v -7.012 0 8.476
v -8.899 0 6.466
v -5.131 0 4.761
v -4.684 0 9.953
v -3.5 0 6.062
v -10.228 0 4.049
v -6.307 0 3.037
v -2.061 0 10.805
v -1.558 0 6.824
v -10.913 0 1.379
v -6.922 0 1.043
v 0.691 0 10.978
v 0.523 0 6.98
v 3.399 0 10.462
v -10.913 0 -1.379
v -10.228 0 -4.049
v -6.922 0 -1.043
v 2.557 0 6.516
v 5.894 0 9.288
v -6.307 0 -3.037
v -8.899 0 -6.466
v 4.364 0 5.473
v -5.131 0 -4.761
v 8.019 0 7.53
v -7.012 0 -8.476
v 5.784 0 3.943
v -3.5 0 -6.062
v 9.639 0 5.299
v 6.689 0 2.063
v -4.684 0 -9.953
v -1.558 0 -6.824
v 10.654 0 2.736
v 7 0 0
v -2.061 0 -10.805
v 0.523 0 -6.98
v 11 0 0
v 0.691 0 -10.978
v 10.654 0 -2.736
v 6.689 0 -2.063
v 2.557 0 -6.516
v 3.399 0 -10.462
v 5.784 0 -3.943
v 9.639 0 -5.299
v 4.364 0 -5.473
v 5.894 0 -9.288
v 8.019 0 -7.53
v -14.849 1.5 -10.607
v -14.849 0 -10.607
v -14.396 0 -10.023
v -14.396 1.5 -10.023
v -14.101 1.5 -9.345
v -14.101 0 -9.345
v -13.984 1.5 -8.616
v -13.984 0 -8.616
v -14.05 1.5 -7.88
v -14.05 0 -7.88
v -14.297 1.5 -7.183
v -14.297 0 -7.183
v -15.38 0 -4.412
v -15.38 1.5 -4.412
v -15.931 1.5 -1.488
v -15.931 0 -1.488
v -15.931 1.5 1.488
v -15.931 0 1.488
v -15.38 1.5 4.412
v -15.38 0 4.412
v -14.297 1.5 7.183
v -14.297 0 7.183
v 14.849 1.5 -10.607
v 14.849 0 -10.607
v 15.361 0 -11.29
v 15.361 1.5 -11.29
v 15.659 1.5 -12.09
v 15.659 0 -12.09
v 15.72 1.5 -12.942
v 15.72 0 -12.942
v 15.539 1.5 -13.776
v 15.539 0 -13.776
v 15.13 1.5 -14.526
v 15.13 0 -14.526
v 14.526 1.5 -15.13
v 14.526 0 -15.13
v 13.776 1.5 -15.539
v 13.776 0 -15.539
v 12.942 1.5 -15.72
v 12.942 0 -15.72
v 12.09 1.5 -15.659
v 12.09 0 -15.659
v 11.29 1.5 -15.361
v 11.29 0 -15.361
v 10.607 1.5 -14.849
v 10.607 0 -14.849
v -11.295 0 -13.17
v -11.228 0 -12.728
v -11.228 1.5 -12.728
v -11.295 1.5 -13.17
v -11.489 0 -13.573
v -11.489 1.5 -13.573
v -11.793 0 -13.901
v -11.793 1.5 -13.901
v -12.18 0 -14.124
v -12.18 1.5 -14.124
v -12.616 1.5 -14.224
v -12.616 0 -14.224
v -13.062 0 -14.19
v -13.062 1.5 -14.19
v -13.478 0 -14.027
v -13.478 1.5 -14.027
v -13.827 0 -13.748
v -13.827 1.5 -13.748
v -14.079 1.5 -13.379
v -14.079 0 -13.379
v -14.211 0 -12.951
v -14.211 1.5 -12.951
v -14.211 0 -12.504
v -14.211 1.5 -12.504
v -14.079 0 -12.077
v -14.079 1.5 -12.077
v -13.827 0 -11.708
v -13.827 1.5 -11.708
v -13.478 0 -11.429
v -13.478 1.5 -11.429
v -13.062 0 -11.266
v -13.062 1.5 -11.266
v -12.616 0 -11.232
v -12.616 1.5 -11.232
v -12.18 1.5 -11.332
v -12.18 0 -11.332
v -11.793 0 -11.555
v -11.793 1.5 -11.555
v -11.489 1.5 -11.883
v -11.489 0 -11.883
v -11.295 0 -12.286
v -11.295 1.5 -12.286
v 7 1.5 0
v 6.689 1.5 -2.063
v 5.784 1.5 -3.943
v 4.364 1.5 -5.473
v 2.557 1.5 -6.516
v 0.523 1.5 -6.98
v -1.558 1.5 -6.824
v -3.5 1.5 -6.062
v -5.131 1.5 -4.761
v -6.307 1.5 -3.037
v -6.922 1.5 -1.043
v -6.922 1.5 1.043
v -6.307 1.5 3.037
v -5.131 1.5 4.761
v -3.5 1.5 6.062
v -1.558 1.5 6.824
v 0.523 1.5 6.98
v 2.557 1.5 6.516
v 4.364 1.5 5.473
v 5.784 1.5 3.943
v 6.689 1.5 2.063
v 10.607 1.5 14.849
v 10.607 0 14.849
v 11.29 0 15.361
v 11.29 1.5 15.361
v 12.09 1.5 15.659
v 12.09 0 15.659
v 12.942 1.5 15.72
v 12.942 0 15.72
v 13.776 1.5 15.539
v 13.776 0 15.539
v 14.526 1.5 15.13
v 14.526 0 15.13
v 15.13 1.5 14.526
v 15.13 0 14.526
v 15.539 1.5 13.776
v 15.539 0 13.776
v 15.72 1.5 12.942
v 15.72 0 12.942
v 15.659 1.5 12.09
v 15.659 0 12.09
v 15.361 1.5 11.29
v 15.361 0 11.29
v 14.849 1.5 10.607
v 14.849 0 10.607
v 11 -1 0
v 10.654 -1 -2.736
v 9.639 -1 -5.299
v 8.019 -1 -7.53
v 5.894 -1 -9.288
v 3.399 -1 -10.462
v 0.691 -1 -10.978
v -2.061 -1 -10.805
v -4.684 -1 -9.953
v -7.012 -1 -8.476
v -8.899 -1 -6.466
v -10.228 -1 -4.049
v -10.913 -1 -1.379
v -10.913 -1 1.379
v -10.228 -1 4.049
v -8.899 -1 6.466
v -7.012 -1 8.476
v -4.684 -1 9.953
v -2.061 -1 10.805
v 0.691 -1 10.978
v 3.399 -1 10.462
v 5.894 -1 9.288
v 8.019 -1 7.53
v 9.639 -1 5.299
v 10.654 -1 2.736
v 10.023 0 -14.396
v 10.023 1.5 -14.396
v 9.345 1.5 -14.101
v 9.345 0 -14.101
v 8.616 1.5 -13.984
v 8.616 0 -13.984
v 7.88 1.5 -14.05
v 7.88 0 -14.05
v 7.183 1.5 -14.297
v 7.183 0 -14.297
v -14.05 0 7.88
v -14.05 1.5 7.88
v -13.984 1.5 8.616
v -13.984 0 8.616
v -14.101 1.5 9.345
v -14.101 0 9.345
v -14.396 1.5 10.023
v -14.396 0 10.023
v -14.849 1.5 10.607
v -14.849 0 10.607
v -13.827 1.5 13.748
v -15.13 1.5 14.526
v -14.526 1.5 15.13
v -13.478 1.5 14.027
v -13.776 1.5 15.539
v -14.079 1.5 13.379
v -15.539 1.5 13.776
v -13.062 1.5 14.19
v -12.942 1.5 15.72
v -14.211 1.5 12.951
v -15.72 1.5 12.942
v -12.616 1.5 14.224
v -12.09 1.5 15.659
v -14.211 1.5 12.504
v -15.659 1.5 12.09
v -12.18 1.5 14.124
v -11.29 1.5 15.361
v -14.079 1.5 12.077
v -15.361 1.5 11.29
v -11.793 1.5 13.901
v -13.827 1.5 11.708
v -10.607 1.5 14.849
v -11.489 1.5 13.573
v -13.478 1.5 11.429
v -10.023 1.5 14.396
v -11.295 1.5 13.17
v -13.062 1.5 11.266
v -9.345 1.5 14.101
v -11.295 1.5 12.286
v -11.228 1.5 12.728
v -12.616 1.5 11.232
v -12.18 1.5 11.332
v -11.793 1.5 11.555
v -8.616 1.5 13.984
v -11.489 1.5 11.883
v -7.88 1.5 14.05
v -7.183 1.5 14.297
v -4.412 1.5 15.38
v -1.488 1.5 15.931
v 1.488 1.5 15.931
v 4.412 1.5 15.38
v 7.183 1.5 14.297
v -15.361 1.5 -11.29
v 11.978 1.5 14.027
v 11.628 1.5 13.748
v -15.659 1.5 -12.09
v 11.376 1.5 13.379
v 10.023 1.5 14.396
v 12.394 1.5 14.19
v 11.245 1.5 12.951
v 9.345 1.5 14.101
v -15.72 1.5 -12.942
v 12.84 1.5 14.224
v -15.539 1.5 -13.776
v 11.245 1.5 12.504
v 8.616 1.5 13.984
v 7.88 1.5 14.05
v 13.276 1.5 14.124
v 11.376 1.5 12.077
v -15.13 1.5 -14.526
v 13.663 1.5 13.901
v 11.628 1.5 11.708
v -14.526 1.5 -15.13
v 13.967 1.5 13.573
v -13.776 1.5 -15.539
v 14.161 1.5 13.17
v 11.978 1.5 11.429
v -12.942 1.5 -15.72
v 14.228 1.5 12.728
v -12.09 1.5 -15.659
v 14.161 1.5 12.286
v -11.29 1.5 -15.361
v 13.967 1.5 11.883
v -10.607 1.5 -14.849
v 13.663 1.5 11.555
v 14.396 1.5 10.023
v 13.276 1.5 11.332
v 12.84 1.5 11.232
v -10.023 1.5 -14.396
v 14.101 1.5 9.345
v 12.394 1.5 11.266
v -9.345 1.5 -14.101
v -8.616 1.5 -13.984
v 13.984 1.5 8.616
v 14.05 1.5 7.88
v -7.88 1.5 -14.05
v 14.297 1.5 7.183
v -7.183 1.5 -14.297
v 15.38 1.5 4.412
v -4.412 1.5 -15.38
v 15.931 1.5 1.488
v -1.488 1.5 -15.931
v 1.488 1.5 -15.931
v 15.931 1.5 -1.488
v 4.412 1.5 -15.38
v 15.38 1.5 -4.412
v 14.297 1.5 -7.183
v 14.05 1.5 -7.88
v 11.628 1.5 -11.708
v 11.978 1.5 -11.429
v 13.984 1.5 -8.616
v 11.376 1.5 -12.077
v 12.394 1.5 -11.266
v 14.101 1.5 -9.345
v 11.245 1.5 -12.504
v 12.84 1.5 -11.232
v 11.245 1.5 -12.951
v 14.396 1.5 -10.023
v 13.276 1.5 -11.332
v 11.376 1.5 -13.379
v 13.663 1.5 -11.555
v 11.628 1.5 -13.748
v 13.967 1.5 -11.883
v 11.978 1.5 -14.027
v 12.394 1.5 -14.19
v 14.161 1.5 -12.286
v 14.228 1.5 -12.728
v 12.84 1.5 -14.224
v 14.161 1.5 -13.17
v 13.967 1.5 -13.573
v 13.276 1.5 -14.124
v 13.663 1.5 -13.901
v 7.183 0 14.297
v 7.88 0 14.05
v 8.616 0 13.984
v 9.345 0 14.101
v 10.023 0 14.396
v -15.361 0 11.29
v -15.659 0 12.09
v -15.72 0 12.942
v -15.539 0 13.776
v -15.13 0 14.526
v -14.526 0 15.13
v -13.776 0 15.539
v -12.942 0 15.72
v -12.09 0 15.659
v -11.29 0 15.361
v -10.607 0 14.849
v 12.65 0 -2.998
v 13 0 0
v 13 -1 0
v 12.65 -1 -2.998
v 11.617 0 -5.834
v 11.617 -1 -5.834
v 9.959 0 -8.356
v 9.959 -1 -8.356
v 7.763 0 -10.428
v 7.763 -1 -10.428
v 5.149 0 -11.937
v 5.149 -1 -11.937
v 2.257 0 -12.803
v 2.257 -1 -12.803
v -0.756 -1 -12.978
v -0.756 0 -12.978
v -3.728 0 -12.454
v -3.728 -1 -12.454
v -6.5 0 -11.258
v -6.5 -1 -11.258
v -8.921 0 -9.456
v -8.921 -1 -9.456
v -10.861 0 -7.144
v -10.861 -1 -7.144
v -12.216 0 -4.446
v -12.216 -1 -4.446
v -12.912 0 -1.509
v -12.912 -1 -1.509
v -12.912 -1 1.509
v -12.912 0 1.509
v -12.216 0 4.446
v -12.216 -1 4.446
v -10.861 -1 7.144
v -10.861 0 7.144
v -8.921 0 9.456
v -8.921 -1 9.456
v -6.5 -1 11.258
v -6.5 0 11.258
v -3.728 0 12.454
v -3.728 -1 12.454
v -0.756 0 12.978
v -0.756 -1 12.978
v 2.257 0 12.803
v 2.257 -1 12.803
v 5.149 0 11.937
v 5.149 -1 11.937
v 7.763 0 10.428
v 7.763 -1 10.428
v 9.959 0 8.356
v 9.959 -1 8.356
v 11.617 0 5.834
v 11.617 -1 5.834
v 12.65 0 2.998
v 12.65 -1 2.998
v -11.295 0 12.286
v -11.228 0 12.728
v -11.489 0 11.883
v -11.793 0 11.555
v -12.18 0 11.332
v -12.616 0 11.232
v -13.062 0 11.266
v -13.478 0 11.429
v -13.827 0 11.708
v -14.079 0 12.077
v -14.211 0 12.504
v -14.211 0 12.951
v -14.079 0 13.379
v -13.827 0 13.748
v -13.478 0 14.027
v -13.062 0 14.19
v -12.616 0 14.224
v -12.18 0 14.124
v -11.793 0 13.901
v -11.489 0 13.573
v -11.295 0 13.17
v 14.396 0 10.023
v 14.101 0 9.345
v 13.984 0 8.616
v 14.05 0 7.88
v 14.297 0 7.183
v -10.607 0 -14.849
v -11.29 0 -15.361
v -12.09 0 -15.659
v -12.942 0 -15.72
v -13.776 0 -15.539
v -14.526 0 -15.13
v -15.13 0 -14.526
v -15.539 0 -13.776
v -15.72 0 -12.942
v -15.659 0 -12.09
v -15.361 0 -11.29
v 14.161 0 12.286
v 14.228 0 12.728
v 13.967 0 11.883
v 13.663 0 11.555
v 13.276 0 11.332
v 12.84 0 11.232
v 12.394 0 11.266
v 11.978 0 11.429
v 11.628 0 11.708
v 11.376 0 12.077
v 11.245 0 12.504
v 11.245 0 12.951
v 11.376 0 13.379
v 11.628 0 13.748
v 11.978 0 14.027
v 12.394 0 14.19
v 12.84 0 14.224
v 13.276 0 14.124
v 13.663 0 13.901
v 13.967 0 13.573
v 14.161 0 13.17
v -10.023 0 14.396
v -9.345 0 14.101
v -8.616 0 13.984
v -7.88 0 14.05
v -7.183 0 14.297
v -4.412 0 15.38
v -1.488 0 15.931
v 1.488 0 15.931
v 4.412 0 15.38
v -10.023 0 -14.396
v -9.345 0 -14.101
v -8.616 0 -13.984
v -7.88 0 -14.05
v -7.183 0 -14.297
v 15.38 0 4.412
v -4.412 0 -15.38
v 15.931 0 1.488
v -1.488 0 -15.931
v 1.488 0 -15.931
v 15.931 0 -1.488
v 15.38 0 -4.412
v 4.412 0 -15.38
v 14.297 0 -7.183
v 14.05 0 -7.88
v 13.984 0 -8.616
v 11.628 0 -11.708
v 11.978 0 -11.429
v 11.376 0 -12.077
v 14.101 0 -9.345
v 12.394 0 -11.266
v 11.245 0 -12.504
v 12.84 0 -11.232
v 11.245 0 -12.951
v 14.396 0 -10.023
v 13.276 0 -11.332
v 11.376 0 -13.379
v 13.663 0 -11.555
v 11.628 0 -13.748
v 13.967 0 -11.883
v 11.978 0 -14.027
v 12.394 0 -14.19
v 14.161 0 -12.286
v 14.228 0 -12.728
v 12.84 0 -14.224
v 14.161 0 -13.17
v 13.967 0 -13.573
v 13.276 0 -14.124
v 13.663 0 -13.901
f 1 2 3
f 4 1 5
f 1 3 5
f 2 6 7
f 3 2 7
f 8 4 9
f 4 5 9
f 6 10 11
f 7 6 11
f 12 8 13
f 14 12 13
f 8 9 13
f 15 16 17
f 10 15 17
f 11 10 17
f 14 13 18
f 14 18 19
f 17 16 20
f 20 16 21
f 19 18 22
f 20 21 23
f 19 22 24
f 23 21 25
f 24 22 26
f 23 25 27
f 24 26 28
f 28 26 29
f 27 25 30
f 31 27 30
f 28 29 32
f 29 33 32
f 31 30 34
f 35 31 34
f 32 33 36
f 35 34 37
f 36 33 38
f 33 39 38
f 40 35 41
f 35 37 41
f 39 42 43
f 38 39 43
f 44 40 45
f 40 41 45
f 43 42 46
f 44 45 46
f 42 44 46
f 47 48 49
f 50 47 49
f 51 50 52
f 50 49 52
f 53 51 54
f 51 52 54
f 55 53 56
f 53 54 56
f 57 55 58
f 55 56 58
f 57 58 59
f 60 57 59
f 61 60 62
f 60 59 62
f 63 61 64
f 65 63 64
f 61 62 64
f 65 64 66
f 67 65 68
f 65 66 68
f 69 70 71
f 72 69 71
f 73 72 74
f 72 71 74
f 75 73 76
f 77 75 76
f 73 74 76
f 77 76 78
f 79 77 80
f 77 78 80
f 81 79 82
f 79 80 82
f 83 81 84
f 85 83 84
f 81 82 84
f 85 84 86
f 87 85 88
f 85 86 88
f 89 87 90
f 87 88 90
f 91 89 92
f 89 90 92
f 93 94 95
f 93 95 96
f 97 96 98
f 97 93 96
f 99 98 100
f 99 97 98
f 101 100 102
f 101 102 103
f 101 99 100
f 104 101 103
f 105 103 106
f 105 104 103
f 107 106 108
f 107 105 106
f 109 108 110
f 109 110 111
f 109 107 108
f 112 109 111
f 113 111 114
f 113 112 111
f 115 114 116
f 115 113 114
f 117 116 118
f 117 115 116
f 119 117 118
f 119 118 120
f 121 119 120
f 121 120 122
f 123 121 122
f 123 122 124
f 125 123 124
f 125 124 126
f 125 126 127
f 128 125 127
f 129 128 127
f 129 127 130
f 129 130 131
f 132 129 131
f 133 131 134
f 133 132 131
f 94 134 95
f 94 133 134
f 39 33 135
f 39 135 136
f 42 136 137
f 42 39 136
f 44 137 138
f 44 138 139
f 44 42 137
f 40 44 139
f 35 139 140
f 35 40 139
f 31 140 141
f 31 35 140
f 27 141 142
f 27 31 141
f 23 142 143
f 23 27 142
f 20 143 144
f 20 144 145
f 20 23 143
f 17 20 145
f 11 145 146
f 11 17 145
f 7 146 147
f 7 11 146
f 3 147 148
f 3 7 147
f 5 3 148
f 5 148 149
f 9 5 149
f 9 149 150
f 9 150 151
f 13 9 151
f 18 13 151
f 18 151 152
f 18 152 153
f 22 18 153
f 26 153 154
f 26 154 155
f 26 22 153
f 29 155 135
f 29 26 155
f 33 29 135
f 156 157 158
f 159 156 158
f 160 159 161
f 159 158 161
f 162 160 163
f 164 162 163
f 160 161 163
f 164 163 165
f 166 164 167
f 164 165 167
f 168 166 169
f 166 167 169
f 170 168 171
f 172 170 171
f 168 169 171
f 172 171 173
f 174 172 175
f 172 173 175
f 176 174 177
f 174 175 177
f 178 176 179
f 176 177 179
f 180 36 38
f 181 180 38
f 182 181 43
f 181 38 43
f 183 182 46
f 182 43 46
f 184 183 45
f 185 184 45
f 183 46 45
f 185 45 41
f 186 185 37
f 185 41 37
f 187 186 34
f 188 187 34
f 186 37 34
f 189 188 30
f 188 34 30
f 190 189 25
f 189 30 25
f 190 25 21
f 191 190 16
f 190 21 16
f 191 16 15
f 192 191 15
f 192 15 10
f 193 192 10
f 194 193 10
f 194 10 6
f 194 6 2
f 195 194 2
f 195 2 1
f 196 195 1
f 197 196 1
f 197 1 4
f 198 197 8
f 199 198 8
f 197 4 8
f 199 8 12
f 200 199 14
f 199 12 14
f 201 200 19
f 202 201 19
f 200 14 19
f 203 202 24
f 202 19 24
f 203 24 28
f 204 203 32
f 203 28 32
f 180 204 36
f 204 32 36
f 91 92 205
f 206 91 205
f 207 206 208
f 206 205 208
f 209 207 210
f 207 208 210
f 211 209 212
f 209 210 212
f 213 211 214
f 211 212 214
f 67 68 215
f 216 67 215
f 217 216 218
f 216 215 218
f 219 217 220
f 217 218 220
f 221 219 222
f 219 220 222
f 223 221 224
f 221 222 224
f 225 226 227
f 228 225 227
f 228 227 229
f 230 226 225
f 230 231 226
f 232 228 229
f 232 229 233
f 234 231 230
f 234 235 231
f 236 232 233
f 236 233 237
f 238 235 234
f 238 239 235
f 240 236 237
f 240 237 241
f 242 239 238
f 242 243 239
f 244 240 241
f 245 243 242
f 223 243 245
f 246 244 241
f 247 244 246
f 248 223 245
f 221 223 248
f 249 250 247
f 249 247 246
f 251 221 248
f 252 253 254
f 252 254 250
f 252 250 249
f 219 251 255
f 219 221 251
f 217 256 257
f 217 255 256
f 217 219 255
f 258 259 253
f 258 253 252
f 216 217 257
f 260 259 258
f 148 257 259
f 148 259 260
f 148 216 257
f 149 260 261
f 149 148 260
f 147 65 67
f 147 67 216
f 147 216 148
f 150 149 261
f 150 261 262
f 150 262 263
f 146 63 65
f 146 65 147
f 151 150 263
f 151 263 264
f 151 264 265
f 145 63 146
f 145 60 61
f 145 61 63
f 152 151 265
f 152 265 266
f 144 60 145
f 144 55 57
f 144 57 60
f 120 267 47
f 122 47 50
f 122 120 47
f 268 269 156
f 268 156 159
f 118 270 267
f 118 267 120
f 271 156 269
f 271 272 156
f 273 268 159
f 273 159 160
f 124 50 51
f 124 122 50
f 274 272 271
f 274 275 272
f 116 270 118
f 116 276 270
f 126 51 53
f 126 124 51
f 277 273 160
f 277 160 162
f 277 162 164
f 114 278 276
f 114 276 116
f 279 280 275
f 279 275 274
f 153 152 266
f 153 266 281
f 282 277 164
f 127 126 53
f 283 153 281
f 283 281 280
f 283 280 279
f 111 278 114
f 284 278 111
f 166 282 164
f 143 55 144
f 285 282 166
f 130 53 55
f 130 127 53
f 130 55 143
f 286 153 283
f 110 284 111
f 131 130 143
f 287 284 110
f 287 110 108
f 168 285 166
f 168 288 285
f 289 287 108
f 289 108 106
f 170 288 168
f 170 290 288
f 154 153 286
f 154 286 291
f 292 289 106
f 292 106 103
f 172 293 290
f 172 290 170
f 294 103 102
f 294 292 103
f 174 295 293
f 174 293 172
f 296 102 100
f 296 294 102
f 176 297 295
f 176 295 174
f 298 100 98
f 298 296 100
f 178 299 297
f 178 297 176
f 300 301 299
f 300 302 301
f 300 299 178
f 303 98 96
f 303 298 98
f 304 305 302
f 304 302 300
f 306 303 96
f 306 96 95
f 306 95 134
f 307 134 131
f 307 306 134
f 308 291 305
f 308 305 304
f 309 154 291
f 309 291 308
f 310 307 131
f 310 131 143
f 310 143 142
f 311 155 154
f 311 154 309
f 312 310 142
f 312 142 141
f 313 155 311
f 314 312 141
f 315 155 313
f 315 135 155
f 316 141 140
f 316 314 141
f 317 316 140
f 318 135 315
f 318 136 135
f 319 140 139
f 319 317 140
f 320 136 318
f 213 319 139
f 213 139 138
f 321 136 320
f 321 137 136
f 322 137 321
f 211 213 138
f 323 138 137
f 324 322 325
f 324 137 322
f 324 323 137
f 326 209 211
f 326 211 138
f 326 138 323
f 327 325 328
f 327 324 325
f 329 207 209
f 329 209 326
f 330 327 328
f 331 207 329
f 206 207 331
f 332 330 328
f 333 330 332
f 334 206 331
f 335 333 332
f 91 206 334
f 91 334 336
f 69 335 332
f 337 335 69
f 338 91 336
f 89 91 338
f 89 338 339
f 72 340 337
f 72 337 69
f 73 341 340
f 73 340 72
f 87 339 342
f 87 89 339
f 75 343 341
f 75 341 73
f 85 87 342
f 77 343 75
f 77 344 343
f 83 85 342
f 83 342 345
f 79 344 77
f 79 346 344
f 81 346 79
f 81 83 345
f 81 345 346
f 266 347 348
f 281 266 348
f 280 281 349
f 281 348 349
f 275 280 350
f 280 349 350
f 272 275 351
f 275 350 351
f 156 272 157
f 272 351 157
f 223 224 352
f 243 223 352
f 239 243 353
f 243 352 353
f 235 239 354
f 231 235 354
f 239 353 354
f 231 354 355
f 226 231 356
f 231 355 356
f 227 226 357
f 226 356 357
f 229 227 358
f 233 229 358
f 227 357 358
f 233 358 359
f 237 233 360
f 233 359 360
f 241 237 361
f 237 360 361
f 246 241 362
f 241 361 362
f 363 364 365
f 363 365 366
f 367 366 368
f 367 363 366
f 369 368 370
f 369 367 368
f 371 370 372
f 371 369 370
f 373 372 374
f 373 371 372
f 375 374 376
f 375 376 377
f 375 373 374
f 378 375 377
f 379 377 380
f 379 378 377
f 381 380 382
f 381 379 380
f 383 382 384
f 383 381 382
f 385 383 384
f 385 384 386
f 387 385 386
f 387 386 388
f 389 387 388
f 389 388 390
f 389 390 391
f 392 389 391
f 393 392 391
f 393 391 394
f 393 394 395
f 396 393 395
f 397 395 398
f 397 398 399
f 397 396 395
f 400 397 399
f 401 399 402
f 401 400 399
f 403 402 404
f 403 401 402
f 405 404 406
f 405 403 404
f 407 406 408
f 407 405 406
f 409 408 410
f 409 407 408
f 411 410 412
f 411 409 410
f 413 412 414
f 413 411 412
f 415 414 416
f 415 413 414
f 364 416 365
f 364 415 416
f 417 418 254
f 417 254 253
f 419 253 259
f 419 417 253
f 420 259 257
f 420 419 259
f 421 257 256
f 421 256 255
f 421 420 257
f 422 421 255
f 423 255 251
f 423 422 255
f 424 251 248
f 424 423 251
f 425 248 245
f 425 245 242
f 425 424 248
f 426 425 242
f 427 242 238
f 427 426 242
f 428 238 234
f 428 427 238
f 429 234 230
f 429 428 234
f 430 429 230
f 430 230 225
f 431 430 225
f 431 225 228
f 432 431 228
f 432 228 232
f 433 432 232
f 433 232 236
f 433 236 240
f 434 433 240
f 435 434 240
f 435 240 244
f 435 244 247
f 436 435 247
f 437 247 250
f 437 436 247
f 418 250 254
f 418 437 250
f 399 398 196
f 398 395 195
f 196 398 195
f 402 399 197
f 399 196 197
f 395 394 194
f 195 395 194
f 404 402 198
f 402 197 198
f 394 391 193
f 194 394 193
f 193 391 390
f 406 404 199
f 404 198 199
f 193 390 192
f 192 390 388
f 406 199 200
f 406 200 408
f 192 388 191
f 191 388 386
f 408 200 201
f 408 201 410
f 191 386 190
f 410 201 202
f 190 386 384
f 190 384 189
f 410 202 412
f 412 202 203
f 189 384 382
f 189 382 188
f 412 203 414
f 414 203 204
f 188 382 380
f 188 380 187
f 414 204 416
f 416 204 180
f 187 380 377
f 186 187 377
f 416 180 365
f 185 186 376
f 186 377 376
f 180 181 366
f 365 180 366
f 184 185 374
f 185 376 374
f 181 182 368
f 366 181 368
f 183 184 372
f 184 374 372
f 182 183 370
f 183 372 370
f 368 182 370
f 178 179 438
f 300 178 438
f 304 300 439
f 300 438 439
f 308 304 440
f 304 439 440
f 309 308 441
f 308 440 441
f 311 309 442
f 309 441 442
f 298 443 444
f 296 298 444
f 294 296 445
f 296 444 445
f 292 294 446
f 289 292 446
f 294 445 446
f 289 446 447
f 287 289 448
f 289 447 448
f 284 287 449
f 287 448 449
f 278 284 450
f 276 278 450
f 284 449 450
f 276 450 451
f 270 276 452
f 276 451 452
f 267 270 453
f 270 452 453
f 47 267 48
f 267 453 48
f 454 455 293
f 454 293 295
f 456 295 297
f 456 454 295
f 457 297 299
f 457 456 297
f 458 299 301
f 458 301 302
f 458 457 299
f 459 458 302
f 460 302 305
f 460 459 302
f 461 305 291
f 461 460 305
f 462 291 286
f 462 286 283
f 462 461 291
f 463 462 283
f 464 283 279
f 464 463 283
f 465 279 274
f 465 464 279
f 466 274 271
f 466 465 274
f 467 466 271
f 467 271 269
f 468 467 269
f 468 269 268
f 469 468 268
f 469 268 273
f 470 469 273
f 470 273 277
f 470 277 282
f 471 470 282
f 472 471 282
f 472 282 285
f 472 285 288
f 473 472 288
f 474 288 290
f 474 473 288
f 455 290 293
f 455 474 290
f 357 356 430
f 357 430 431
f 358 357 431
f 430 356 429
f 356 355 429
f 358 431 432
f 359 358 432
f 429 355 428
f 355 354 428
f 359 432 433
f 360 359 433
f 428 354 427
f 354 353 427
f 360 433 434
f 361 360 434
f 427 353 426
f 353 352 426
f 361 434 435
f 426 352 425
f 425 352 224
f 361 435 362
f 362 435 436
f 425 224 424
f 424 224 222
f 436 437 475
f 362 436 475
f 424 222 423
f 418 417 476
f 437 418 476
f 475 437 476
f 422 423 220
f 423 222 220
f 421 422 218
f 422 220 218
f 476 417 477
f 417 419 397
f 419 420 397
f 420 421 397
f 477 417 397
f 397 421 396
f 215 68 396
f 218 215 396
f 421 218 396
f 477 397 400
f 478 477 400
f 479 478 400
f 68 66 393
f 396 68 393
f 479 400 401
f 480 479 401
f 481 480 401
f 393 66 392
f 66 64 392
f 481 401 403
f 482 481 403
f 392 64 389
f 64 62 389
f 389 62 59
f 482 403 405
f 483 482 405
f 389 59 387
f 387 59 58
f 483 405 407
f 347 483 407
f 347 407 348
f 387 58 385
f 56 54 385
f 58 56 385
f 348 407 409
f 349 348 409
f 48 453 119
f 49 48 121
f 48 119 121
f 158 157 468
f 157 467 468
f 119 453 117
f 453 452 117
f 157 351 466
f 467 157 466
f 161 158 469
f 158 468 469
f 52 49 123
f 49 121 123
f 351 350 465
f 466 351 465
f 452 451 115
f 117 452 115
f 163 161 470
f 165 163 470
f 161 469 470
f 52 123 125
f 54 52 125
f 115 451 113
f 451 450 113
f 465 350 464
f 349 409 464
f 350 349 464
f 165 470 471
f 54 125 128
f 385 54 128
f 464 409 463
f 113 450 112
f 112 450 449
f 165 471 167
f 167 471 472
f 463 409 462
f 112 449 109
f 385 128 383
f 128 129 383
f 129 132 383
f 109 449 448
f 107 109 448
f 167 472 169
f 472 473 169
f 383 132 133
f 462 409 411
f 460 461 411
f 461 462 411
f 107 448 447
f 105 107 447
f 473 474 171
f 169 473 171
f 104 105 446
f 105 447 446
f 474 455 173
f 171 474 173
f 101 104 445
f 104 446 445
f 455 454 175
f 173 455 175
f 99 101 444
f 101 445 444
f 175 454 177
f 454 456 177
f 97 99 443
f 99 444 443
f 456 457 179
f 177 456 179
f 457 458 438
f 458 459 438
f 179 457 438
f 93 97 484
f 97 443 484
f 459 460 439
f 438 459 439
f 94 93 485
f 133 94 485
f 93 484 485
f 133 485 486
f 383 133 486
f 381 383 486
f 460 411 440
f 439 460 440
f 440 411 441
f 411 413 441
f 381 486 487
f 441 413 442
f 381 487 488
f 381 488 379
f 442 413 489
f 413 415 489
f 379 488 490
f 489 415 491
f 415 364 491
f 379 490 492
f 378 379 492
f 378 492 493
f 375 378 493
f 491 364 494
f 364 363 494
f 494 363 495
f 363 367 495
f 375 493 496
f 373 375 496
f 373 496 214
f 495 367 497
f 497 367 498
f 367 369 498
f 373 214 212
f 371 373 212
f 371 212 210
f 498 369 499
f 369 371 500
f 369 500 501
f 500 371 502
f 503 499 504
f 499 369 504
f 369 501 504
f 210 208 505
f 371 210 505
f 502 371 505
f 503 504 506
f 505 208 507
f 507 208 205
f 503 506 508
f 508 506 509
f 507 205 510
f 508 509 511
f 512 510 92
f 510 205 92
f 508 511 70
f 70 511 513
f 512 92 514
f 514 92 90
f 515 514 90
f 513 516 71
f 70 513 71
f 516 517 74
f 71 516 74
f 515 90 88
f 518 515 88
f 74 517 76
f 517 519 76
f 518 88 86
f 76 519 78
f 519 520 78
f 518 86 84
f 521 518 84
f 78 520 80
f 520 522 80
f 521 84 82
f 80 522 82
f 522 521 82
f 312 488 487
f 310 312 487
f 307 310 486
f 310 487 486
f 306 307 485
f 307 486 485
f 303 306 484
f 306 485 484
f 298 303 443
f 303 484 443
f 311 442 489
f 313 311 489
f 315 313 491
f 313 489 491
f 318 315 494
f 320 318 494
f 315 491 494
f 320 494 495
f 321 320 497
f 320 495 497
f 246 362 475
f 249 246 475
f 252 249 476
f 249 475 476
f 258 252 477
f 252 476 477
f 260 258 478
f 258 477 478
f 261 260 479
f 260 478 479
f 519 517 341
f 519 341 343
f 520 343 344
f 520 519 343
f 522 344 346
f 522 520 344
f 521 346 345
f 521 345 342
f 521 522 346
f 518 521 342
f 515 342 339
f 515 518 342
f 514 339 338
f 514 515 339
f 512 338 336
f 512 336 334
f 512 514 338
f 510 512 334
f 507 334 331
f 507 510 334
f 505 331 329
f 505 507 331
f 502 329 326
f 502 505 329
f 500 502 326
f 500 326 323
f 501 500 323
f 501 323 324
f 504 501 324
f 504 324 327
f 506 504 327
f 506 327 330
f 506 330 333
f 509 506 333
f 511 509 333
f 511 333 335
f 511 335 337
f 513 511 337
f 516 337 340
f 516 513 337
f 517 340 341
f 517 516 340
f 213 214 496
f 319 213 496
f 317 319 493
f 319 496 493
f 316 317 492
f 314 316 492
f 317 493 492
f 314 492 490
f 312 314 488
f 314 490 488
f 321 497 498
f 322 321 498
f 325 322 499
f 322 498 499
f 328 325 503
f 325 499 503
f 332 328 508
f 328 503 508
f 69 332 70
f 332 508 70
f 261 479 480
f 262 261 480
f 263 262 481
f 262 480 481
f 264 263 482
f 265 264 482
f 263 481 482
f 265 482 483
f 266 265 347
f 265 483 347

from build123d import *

# Parameters (mm, degrees)
SKETCH1_R           = 1.5
SKETCH1_R_2         = 7
BOSS_EXTRUDE1_DEPTH = 1.5
SKETCH1_3_R         = 13
SKETCH1_3_R_2       = 11
BOSS_EXTRUDE2_DEPTH = 1


with BuildPart() as part:
    # Sketch1 → Boss-Extrude1 (new body)
    with BuildSketch(Plane(origin=(0, 0, 0), x_dir=(1, 0, 0), z_dir=(0, 1, 0))):
        with BuildLine():
            ThreePointArc((14.297039341, 7.182942718), (14.019613784, 8.984050781), (14.849242405, 10.606601718))
            ThreePointArc((14.849242405, 10.606601718), (14.849242405, 14.849242405), (10.606601718, 14.849242405))
            ThreePointArc((10.606601718, 14.849242405), (8.984050781, 14.019613784), (7.182942718, 14.297039341))
            ThreePointArc((7.182942718, 14.297039341), (0, 16), (-7.182942718, 14.297039341))
            ThreePointArc((-7.182942718, 14.297039341), (-8.984050781, 14.019613784), (-10.606601718, 14.849242405))
            ThreePointArc((-10.606601718, 14.849242405), (-14.849242405, 14.849242405), (-14.849242405, 10.606601718))
            ThreePointArc((-14.849242405, 10.606601718), (-14.019613784, 8.984050781), (-14.297039341, 7.182942718))
            ThreePointArc((-14.297039341, 7.182942718), (-16, 0), (-14.297039341, -7.182942718))
            ThreePointArc((-14.297039341, -7.182942718), (-14.019613784, -8.984050781), (-14.849242405, -10.606601718))
            ThreePointArc((-14.849242405, -10.606601718), (-14.849242405, -14.849242405), (-10.606601718, -14.849242405))
            ThreePointArc((-10.606601718, -14.849242405), (-8.984050781, -14.019613784), (-7.182942718, -14.297039341))
            ThreePointArc((-7.182942718, -14.297039341), (0, -16), (7.182942718, -14.297039341))
            ThreePointArc((7.182942718, -14.297039341), (8.984050781, -14.019613784), (10.606601718, -14.849242405))
            ThreePointArc((10.606601718, -14.849242405), (14.849242405, -14.849242405), (14.849242405, -10.606601718))
            ThreePointArc((14.849242405, -10.606601718), (14.019613784, -8.984050781), (14.297039341, -7.182942718))
            ThreePointArc((14.297039341, -7.182942718), (16, 0), (14.297039341, 7.182942718))
        make_face()
        with Locations((12.727922061, 12.727922061)):
            Circle(SKETCH1_R, mode=Mode.SUBTRACT)
        with Locations((12.727922061, -12.727922061)):
            Circle(SKETCH1_R, mode=Mode.SUBTRACT)
        with Locations((-12.727922061, 12.727922061)):
            Circle(SKETCH1_R, mode=Mode.SUBTRACT)
        with Locations((-12.727922061, -12.727922061)):
            Circle(SKETCH1_R, mode=Mode.SUBTRACT)
        Circle(SKETCH1_R_2, mode=Mode.SUBTRACT)
    extrude(amount=BOSS_EXTRUDE1_DEPTH)

    # Sketch1<3> → Boss-Extrude2 (add)
    with BuildSketch(Plane(origin=(0, 0, 0), x_dir=(1, 0, 0), z_dir=(0, 1, 0))):
        Circle(SKETCH1_3_R)
        Circle(SKETCH1_3_R_2, mode=Mode.SUBTRACT)
    extrude(amount=-BOSS_EXTRUDE2_DEPTH)


solid = part.part
